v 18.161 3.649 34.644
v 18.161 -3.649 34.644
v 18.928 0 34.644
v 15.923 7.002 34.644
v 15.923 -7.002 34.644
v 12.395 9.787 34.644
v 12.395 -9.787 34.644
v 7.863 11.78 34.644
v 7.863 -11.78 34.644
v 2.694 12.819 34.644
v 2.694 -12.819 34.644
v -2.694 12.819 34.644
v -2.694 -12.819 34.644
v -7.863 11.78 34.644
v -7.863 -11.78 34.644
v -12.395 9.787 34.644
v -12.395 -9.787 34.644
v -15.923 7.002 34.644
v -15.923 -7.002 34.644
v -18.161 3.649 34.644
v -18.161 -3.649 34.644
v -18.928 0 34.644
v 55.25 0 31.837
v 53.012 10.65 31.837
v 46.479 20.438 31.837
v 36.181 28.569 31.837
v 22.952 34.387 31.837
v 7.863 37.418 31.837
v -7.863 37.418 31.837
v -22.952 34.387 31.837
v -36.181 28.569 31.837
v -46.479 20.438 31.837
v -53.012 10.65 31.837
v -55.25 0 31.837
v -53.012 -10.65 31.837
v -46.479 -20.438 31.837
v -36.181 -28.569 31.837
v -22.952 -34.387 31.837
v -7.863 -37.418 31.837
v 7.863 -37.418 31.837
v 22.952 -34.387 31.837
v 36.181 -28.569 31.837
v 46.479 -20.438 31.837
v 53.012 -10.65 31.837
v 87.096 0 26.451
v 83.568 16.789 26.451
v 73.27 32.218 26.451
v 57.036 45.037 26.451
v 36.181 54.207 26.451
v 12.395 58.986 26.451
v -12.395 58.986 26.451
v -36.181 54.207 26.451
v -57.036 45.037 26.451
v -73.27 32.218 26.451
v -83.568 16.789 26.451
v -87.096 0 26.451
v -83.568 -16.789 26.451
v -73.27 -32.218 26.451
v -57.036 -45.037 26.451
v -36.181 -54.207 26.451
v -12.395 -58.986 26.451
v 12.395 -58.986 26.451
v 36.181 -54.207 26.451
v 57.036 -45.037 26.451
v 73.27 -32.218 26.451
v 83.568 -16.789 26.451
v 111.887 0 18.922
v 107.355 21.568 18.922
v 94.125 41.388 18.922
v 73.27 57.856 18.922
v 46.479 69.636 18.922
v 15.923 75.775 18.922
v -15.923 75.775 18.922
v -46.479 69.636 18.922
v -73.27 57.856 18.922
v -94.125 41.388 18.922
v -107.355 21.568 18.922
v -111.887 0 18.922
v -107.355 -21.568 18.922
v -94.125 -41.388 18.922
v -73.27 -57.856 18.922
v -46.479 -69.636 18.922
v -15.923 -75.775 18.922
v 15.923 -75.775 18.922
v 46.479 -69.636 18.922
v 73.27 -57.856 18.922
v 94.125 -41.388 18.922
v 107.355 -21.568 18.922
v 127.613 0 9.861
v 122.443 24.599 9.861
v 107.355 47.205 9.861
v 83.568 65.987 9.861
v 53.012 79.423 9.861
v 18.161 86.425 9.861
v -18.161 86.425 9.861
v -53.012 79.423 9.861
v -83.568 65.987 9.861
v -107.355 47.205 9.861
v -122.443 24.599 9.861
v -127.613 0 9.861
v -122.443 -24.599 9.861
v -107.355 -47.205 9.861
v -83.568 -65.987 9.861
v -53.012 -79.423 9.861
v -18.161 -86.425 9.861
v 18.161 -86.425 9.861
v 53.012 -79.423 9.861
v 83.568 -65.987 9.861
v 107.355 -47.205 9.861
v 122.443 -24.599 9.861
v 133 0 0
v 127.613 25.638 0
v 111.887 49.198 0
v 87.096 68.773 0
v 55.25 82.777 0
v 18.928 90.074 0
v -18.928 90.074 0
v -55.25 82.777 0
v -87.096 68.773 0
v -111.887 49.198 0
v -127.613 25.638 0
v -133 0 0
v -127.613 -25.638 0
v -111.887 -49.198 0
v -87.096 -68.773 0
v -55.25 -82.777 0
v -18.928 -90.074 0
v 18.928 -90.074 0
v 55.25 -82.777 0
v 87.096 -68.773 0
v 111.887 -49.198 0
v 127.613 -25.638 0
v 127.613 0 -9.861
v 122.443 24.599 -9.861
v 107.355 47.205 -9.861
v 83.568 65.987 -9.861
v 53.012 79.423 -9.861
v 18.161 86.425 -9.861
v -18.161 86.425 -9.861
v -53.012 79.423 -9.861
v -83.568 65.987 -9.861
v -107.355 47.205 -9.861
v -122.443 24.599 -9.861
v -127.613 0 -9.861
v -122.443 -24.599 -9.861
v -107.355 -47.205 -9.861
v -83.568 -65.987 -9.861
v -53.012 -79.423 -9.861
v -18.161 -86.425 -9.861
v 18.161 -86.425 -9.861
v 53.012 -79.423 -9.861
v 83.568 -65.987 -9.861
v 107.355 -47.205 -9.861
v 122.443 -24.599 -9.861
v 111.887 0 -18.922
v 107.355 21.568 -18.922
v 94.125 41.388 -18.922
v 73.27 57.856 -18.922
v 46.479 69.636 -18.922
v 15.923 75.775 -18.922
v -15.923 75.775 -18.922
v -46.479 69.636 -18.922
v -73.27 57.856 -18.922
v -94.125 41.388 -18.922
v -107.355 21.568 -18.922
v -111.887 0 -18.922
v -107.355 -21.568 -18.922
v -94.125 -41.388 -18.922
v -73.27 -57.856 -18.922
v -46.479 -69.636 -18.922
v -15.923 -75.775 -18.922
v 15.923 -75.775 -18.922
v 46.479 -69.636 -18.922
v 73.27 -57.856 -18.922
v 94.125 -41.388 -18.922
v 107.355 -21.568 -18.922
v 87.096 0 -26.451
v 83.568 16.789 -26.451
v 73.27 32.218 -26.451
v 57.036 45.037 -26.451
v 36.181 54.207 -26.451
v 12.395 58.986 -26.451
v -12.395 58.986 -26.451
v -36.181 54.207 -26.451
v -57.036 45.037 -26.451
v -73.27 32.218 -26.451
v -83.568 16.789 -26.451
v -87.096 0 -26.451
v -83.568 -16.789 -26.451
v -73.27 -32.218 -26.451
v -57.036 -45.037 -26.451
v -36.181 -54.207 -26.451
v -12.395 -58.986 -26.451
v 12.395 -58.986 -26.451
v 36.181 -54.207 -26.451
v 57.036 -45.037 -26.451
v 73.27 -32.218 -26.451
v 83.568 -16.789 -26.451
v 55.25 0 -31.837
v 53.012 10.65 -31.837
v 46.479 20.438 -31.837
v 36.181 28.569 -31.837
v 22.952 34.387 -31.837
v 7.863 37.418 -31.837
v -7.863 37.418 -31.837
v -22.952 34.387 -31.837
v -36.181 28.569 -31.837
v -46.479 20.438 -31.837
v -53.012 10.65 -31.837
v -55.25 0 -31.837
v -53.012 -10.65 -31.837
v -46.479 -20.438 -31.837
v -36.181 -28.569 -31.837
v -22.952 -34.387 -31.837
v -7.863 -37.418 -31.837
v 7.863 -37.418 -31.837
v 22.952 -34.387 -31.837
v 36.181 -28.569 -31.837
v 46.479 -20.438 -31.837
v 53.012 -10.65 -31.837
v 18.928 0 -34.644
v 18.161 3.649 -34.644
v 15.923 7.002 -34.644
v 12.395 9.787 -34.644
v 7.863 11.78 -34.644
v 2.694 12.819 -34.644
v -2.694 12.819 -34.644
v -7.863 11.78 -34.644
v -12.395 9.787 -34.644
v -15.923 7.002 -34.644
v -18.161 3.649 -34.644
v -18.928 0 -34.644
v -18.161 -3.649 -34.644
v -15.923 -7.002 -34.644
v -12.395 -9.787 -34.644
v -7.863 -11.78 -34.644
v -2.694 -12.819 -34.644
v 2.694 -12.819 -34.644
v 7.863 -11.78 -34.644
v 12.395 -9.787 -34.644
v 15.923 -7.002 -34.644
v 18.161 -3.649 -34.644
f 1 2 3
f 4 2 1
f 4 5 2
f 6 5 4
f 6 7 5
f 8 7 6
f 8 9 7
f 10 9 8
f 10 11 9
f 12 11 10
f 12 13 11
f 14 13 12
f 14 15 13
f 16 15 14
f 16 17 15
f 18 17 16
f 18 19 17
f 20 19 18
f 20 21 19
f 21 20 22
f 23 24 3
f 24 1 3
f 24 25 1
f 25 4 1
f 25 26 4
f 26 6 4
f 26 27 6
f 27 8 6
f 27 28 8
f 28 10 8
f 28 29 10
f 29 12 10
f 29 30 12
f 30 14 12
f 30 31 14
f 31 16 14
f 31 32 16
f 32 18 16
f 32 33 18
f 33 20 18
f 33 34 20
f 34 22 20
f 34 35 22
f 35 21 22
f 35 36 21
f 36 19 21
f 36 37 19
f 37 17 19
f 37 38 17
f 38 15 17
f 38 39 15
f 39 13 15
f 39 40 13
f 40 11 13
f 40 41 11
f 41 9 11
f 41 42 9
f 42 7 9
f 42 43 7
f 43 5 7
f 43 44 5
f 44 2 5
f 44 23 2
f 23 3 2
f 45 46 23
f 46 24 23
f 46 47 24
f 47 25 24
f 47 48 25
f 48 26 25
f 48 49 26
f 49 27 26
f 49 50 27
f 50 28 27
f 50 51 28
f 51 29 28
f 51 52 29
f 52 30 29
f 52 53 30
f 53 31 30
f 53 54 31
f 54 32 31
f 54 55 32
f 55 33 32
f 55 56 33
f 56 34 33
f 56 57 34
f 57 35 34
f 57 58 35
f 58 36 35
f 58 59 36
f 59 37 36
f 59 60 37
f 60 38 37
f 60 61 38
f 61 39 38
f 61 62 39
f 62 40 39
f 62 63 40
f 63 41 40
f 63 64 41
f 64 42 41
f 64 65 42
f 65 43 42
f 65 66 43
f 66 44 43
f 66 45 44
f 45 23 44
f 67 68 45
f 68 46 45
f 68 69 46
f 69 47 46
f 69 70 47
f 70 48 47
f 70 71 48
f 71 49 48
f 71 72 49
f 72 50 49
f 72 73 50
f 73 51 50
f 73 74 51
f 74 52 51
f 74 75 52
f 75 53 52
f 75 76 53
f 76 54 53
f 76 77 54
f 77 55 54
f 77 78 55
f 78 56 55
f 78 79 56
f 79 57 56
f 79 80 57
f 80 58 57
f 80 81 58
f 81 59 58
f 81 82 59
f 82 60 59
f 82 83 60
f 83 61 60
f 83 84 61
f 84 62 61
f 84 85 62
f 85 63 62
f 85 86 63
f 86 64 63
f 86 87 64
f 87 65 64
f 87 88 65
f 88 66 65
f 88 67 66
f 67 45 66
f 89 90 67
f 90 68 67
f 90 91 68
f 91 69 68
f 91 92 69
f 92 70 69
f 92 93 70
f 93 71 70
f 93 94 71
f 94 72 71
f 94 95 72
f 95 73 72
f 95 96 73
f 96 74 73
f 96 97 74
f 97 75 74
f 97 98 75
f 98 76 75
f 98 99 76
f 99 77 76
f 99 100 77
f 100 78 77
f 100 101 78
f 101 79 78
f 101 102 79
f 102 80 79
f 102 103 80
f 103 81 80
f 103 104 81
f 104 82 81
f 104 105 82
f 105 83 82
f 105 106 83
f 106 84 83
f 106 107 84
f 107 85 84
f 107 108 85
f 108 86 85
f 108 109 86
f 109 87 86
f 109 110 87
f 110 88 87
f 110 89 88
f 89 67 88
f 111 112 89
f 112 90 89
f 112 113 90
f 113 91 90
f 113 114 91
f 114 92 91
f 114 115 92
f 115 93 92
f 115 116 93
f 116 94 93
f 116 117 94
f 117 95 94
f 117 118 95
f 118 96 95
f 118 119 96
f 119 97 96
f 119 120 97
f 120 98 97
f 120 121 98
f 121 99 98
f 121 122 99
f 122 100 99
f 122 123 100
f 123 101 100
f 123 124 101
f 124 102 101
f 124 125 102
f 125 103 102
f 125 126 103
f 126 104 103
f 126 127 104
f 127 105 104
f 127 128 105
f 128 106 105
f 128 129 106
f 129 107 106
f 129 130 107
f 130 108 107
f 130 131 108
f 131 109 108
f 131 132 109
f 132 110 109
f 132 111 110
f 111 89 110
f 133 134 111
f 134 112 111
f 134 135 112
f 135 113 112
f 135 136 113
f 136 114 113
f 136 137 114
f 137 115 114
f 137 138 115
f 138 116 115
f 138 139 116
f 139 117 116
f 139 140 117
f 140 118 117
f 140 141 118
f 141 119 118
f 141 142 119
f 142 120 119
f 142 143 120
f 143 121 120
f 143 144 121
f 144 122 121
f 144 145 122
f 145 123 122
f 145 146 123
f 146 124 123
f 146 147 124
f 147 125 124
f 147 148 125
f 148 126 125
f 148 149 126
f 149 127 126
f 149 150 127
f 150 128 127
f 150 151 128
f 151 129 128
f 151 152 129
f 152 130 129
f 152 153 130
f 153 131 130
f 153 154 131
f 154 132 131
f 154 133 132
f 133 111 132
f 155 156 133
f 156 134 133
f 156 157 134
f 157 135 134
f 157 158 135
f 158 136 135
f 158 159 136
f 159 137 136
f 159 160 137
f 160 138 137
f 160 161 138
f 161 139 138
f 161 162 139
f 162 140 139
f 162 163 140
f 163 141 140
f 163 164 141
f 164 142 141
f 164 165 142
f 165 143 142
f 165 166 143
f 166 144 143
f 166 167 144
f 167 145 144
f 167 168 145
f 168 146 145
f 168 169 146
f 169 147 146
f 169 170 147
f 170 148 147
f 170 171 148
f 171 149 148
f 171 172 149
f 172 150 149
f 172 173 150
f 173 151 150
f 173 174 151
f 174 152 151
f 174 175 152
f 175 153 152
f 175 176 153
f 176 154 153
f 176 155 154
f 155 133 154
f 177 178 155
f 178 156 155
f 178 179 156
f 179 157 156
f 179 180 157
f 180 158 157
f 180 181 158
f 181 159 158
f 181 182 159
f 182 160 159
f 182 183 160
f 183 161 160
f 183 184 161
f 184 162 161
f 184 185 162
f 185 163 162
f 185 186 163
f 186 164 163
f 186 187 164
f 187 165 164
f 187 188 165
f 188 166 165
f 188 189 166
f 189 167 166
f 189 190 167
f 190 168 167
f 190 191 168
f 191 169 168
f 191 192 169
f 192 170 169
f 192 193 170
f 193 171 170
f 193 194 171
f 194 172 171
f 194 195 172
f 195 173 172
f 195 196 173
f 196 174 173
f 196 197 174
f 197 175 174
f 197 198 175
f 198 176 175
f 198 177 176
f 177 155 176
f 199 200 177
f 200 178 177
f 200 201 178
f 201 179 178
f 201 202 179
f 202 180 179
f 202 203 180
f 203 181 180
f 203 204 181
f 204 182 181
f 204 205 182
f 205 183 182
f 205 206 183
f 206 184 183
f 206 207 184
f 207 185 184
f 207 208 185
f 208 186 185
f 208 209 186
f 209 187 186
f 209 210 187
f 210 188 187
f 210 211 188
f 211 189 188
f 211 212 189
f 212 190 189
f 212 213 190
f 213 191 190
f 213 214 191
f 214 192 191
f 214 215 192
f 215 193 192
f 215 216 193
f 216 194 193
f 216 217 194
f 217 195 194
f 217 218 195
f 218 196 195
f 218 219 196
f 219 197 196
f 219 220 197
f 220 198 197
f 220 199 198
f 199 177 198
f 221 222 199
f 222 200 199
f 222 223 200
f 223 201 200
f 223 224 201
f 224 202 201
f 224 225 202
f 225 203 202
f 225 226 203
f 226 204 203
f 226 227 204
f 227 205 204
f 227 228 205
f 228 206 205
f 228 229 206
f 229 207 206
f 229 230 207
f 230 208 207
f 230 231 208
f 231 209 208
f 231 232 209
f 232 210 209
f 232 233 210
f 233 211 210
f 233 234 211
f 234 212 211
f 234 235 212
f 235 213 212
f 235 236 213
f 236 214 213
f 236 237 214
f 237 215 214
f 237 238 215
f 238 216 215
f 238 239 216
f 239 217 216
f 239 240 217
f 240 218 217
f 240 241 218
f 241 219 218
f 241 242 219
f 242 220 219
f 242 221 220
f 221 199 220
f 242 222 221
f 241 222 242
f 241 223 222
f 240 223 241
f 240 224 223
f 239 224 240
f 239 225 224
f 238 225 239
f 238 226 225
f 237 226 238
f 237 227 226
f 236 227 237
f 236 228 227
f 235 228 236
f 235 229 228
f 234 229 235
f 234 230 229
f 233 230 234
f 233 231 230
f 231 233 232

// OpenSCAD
// Generated by SolidPython 1.0.1 on 2020-07-29 00:46:54


scale(v = [19, 13, 5]) {
	sphere(r = 7);
}
/***********************************************
*********      SolidPython code:      **********
************************************************
 
# import packages: SolidPython
from solid import *
from solid.utils import *
from itertools import chain, combinations, permutations


class Resize:

    def __init__(self, scad_file):
        self.scad_file = scad_file
        #self.scad_file = import_scad(scad_file)
        # cone/cylinder param:
        self.r1 = 0
        self.r2 = 0
        self.h = 0
        # rectangular prism param:
        self.w = 0
        self.l = 0
        # ellipse param:
        self.r = 0

    # import OpenScad code (file name corresponds to shape)


    # classify shape + parameters
    def assign(self, param1, param2, param3):
        if self.scad_file == 'cone.scad':
            self.r1 = param1
            self.r2 = param2
            self.h = param3
        elif self.scad_file == 'cylinder.scad':
            self.r1 = param1
            self.r2 = param2
            self.h = param3
        elif self.scad_file == 'rectangularPrism.scad':
            self.h = param1
            self.l = param2
            self.w = param3
        else:
            self.r = param1
            self.h = param2

    # resize parameters
    def iterate(self):
        x = range(3, 20, 2)
        i = 1
        if self.scad_file == 'cone.scad':
            tempList = list(permutations(x, 2))
            for temp in tempList:
                param1 = temp[0]
                param2 = temp[1]
                filepath = 'produced_scad_files/' + 'cone' + str(param1) + '_' + str(param2) + '_' + '.scad'
                scad_render_to_file(cylinder(h=param1, r1=param2, r2=0), filepath)

        elif self.scad_file == 'cylinder.scad':
            tempList = list(permutations(x, 3))
            for temp in tempList:
                param1 = temp[0]
                param2 = temp[1]
                filepath = 'produced_scad_files/' + 'cylinder' + str(param1) + '_' + str(param2) + '_' + '.scad'
                scad_render_to_file(cylinder(h=param1, r1=param2, r2=param2), filepath)

        elif self.scad_file == 'rectangularPrism.scad':
            tempList = list(permutations(x, 3))
            for temp in tempList:
                param1 = temp[0]
                param2 = temp[1]
                param3 = temp[2]
                filepath = 'produced_scad_files/' + 'rectangularPrism' + str(param1) + '_' + str(param2) + '_' + str(
                    param3) + '.scad'
                scad_render_to_file(cube(size=(param1, param2, param3)), filepath)

        elif self.scad_file == 'ellipse.scad':
            tempList = list(permutations(x, 4))
            for temp in tempList:
                param1 = temp[0]
                param2 = temp[1]
                param3 = temp[2]
                param4 = temp[3]
                filepath = 'produced_scad_files/' + 'ellipse' + str(param1) + '_' + str(param2) + '_' + str(param3) + '_' + str(param4) + '.scad'
                scad_render_to_file(scale([param1, param2, param3])(sphere(r=param4)), filepath)

    def render_to_scadfile(self):
        scad_render_to_file(scad, 'example.scad') 
 
************************************************/
